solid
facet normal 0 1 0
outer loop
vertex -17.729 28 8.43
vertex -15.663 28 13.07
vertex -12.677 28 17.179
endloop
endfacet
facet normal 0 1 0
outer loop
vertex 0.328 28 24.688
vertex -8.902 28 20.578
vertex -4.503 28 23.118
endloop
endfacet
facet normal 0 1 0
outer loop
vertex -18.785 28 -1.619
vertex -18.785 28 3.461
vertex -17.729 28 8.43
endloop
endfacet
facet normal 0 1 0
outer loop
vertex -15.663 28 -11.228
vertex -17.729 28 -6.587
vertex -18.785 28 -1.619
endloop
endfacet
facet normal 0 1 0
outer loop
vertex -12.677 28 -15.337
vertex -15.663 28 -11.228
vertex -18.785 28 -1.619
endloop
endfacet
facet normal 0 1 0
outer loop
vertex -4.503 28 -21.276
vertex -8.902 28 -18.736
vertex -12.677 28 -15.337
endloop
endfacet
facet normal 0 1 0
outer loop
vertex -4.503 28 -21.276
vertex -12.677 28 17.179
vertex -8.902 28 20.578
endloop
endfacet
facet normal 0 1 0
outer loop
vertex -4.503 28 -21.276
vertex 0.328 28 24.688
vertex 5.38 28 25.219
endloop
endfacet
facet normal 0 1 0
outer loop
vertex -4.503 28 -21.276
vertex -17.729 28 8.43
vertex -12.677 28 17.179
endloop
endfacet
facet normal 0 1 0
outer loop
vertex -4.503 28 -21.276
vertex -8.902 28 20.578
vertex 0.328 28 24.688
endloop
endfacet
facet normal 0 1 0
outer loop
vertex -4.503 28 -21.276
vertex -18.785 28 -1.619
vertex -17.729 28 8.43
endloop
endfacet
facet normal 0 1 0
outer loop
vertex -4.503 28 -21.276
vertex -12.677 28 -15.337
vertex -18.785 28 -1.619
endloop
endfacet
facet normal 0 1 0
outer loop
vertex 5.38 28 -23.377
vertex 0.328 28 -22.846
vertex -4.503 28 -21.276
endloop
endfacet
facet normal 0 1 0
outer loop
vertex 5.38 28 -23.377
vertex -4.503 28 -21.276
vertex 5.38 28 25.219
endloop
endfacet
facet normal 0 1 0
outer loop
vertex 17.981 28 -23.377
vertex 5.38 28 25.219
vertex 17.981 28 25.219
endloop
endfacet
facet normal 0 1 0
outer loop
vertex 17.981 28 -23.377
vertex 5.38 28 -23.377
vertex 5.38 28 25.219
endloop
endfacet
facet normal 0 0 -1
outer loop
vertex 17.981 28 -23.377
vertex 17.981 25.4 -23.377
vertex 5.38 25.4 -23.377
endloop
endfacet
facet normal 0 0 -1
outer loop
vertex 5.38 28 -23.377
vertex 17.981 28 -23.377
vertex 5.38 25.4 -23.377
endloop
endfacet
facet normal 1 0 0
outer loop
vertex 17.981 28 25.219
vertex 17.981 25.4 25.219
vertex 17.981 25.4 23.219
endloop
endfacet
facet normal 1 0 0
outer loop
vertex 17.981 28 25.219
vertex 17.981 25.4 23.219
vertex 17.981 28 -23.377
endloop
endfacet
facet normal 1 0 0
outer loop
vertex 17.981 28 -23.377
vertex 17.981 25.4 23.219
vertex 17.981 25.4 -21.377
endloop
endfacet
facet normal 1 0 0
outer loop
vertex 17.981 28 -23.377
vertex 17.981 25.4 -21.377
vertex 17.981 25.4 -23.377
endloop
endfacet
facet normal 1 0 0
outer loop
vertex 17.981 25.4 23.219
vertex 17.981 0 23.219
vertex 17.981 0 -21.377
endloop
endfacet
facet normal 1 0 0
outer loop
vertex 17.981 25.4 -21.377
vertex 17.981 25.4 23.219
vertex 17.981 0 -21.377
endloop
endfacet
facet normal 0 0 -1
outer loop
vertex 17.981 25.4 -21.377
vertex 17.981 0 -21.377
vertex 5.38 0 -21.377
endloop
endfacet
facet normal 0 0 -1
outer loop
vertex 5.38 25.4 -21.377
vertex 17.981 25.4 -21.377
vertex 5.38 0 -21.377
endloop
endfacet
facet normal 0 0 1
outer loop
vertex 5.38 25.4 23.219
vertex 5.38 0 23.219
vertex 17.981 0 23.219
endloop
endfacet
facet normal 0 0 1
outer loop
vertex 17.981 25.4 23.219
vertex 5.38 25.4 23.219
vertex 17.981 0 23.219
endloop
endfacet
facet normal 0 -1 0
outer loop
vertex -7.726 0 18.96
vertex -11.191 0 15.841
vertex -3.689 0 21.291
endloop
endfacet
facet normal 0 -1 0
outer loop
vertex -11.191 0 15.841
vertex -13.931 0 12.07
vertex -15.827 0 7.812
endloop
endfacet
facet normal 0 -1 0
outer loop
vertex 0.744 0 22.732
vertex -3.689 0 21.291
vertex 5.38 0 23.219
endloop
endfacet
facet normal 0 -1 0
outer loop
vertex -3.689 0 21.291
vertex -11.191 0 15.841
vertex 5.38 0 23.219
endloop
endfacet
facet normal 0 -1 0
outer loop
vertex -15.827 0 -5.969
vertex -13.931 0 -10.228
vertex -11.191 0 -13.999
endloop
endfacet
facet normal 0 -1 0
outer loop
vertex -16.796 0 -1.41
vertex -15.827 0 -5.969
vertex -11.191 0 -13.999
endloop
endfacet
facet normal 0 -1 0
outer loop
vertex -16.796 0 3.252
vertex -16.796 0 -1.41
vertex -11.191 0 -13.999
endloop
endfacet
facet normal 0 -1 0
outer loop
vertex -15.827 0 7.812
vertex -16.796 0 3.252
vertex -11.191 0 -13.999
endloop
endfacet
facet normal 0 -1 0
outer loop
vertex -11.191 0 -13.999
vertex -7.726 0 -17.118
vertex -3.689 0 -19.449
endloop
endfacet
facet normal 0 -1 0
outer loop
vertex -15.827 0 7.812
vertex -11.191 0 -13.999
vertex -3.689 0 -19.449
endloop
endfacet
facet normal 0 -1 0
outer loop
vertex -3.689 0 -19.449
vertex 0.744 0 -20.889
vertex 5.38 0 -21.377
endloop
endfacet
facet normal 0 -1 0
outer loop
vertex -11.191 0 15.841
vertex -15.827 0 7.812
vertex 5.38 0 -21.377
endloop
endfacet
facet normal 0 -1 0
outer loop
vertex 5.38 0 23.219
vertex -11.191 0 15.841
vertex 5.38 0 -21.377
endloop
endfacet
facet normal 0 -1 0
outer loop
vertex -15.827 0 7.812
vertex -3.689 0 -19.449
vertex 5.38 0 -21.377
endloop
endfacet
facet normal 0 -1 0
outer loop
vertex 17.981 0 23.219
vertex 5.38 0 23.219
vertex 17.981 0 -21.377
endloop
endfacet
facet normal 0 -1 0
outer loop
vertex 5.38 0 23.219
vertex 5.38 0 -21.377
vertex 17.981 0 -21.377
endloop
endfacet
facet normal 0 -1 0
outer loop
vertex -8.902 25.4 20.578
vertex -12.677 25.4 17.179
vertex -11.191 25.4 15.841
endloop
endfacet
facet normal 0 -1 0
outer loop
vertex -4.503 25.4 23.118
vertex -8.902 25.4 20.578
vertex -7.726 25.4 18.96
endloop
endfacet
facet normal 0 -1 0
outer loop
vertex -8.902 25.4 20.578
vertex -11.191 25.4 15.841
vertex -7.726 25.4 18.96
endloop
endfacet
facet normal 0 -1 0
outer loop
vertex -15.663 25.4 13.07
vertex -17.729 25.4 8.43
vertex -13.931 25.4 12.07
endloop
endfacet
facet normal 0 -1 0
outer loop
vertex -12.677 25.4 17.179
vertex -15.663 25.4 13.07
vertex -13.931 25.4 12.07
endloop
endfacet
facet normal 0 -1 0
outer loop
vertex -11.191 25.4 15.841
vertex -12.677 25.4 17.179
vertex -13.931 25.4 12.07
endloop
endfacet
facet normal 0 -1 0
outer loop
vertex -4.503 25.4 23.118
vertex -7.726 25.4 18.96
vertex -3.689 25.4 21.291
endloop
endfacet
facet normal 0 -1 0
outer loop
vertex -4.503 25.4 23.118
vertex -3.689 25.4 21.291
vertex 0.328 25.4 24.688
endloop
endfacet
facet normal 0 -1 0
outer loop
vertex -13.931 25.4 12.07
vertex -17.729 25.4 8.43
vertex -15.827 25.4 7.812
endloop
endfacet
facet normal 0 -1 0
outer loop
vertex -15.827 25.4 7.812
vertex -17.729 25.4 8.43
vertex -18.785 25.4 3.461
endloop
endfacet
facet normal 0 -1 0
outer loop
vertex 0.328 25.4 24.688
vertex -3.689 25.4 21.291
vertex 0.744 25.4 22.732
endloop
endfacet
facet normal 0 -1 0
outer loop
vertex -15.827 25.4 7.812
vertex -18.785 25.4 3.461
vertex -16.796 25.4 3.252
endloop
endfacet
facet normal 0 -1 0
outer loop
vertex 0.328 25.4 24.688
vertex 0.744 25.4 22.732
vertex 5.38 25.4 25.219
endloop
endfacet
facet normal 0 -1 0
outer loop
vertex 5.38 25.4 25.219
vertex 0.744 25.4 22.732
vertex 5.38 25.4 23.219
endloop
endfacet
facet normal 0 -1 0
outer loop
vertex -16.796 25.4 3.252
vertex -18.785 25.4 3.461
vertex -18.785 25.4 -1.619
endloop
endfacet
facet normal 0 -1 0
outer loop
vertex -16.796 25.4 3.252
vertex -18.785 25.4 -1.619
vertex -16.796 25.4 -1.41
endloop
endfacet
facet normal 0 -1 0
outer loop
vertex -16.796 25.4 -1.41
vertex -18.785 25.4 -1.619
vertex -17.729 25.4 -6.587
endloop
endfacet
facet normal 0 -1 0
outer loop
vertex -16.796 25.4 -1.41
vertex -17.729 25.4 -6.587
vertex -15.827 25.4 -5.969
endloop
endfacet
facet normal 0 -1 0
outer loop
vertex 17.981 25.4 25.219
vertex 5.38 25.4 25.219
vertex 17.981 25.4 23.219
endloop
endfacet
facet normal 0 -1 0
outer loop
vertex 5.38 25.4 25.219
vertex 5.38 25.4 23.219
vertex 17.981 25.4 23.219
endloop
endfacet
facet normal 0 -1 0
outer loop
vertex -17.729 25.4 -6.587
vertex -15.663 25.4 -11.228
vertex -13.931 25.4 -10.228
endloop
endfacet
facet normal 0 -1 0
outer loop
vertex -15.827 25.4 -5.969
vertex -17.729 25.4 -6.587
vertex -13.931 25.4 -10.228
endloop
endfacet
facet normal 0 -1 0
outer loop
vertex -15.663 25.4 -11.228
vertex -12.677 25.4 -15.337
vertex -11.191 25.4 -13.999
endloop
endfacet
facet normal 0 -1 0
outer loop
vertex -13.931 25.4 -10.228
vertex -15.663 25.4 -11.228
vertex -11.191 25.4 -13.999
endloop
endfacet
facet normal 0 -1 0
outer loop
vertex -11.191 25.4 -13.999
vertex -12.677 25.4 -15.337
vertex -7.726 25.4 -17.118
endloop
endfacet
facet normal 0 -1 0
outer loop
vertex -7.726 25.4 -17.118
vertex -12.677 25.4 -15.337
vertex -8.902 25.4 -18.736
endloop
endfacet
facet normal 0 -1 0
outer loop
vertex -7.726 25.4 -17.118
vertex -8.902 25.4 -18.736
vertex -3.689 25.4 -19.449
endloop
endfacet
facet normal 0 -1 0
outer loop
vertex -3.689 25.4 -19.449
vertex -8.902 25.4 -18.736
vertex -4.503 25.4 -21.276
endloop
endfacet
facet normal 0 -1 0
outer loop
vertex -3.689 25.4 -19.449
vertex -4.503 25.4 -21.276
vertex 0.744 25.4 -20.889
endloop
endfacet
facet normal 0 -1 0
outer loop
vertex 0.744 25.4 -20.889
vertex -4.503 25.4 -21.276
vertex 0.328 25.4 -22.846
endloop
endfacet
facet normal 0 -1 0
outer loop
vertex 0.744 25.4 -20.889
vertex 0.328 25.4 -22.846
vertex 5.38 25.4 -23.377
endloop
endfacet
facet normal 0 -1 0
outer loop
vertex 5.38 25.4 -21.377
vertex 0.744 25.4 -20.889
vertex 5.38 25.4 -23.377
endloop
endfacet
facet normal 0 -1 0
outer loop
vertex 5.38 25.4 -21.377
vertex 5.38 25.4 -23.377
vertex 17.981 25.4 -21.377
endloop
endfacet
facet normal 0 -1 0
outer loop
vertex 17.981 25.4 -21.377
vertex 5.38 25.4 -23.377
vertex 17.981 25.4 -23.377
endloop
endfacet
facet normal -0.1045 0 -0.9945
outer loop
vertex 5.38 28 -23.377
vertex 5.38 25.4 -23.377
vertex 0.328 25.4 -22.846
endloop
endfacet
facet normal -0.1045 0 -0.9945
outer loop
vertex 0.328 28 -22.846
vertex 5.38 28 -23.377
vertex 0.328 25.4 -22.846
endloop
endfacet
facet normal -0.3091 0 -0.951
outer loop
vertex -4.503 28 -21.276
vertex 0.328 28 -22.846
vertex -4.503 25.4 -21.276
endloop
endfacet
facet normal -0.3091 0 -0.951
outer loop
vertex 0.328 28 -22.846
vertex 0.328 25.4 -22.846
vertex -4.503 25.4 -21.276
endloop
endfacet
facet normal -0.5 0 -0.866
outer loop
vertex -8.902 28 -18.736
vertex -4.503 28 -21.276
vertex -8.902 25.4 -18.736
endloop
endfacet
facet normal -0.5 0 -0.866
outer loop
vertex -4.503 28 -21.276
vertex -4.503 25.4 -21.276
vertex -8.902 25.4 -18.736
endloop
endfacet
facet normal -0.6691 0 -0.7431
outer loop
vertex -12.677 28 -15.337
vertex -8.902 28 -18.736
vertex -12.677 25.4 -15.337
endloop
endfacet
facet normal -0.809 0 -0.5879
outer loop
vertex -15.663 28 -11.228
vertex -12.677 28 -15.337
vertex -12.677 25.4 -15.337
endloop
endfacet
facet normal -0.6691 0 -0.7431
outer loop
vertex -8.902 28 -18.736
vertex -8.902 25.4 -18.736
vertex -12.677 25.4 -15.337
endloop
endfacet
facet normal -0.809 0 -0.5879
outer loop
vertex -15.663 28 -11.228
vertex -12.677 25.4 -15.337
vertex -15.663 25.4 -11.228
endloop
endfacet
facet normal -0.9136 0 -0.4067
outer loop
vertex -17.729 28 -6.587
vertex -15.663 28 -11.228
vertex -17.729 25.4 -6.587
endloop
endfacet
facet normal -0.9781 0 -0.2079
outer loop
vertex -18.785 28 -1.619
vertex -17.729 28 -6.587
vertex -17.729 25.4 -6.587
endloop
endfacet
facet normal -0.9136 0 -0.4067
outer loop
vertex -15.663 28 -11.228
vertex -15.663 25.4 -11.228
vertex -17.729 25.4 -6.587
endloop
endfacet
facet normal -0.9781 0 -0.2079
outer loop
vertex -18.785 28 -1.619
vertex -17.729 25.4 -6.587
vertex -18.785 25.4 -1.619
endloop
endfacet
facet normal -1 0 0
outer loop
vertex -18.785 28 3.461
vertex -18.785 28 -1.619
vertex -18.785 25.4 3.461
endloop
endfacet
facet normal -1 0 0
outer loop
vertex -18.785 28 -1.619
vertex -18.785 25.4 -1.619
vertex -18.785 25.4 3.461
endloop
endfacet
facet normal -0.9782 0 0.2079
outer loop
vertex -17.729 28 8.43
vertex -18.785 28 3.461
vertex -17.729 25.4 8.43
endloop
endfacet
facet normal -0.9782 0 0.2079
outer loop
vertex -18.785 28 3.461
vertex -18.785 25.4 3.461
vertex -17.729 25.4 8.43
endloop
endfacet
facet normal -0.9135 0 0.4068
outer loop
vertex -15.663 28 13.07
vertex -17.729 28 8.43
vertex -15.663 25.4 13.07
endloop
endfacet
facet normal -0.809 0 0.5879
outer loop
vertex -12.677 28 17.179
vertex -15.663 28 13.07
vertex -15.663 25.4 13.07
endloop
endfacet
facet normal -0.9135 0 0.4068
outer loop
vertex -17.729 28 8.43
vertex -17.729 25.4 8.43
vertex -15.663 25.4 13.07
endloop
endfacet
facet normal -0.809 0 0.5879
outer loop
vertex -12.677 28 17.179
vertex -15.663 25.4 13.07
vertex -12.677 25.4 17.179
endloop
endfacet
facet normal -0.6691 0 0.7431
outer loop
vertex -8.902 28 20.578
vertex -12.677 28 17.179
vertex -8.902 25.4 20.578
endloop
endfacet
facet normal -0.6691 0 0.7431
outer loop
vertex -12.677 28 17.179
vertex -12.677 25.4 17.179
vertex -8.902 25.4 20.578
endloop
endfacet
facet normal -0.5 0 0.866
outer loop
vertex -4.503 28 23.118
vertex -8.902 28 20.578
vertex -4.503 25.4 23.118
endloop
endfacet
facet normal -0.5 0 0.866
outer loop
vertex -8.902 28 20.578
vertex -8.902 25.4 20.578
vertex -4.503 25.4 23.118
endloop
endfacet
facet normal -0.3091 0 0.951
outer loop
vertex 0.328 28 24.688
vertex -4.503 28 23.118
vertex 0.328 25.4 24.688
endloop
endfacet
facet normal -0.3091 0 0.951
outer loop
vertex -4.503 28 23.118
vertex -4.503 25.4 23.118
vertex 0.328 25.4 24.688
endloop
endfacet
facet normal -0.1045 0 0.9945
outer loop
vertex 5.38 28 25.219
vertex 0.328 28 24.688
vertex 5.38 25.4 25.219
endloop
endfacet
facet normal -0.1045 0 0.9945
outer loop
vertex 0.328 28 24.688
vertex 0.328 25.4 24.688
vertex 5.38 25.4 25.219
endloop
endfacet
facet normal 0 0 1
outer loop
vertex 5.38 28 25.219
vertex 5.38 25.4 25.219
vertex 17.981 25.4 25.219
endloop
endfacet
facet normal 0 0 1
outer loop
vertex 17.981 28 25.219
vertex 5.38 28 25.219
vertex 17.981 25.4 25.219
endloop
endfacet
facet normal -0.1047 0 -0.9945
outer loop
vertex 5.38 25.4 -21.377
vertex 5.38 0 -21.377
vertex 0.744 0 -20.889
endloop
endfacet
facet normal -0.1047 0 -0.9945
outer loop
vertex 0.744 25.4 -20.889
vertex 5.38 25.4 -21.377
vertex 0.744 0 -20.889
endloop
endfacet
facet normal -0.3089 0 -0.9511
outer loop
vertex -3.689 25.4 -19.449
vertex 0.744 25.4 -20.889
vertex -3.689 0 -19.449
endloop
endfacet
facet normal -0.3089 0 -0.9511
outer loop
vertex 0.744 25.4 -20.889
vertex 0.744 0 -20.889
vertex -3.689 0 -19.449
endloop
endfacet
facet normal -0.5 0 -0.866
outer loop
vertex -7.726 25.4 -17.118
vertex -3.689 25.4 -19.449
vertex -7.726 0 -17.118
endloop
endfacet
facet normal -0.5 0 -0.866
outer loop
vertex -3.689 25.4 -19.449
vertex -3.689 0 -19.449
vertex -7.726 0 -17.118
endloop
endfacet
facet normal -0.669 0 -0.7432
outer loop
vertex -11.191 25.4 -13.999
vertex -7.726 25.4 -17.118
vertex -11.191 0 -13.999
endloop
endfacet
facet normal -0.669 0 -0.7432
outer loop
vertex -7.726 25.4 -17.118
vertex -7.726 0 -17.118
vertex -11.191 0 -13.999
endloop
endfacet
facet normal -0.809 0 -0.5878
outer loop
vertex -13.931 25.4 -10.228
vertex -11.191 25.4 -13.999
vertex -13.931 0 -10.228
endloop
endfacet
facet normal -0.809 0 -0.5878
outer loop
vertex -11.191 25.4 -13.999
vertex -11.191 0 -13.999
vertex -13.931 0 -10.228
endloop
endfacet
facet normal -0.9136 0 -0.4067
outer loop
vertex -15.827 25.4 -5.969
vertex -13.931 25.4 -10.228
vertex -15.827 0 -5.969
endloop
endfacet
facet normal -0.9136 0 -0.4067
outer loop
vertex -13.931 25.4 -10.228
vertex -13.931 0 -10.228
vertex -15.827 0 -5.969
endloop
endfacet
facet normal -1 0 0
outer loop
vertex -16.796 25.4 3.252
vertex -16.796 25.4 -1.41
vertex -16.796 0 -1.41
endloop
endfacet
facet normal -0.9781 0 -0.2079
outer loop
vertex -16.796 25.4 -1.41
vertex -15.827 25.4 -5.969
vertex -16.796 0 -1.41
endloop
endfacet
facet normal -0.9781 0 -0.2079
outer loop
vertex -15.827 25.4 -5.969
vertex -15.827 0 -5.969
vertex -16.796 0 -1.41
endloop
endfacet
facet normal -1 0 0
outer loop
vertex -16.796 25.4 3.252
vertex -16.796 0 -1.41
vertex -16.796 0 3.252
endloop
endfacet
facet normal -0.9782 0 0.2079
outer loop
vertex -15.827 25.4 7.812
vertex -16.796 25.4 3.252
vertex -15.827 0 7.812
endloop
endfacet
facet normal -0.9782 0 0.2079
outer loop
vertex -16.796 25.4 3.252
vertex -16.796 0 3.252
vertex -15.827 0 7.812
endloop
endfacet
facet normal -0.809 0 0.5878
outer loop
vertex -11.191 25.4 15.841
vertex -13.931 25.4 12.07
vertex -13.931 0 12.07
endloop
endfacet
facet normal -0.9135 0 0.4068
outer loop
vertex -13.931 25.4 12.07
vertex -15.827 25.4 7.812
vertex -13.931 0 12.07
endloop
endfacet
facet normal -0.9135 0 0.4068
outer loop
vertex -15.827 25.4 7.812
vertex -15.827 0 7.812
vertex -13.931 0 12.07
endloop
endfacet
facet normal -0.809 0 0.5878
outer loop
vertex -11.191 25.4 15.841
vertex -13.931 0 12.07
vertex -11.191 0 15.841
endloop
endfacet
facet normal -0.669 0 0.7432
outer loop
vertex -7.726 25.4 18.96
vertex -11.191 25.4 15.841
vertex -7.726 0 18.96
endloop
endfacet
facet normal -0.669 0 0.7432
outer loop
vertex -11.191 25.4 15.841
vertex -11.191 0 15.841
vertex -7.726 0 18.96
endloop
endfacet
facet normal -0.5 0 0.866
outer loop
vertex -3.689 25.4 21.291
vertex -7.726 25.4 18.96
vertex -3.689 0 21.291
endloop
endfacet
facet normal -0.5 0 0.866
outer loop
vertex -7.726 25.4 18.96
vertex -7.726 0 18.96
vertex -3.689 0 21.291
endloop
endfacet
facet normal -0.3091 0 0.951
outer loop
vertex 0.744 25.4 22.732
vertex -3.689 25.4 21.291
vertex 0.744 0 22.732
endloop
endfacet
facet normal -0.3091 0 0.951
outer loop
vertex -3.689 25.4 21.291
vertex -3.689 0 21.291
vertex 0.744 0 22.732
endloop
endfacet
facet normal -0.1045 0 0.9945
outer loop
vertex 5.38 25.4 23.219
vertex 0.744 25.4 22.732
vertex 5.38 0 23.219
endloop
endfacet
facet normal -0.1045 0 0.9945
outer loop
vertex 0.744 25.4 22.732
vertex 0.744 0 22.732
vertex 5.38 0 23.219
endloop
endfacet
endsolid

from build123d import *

# Parameters (mm, degrees)
BOSS_EXTRUDE1_DEPTH = 28
BOSS_EXTRUDE2_START = -2.6
BOSS_EXTRUDE2_DEPTH = 2.6


with BuildPart() as part:
    # Sketch1 → Boss-Extrude1 (new body)
    with BuildSketch(Plane(origin=(0, 0, 0), x_dir=(1, 0, 0), z_dir=(0, 1, 0))):
        with BuildLine():
            Line((5.379822255, -23.218858624), (17.981010255, -23.218858624))
            Line((17.981010255, -23.218858624), (17.981010255, 21.376607386))
            Line((17.981010255, 21.376607386), (5.379822255, 21.376607386))
            ThreePointArc((5.379822255, 21.376607386), (-16.91791075, -0.921125619), (5.379822255, -23.218858624))
        make_face()
    extrude(amount=BOSS_EXTRUDE1_DEPTH)

    # Sketch2 → Boss-Extrude2 (add)
    with BuildSketch(Plane(origin=(0, 28, 0), x_dir=(1, 0, 0), z_dir=(0, 1, 0)).offset(BOSS_EXTRUDE2_START)):
        with BuildLine():
            Line((5.379822255, -25.218858624), (17.981010255, -25.218858624))
            Line((17.981010255, -25.218858624), (17.981010255, -23.218858624))
            Line((17.981010255, -23.218858624), (5.379822255, -23.218858624))
            ThreePointArc((5.379822255, -23.218858624), (-16.91791075, -0.921125619), (5.379822255, 21.376607386))
            Line((5.379822255, 21.376607386), (17.981010255, 21.376607386))
            Line((17.981010255, 21.376607386), (17.981010255, 23.376607386))
            Line((17.981010255, 23.376607386), (5.379822255, 23.376607386))
            ThreePointArc((5.379822255, 23.376607386), (-18.91791075, -0.921125619), (5.379822255, -25.218858624))
        make_face()
    extrude(amount=BOSS_EXTRUDE2_DEPTH)


solid = part.part
